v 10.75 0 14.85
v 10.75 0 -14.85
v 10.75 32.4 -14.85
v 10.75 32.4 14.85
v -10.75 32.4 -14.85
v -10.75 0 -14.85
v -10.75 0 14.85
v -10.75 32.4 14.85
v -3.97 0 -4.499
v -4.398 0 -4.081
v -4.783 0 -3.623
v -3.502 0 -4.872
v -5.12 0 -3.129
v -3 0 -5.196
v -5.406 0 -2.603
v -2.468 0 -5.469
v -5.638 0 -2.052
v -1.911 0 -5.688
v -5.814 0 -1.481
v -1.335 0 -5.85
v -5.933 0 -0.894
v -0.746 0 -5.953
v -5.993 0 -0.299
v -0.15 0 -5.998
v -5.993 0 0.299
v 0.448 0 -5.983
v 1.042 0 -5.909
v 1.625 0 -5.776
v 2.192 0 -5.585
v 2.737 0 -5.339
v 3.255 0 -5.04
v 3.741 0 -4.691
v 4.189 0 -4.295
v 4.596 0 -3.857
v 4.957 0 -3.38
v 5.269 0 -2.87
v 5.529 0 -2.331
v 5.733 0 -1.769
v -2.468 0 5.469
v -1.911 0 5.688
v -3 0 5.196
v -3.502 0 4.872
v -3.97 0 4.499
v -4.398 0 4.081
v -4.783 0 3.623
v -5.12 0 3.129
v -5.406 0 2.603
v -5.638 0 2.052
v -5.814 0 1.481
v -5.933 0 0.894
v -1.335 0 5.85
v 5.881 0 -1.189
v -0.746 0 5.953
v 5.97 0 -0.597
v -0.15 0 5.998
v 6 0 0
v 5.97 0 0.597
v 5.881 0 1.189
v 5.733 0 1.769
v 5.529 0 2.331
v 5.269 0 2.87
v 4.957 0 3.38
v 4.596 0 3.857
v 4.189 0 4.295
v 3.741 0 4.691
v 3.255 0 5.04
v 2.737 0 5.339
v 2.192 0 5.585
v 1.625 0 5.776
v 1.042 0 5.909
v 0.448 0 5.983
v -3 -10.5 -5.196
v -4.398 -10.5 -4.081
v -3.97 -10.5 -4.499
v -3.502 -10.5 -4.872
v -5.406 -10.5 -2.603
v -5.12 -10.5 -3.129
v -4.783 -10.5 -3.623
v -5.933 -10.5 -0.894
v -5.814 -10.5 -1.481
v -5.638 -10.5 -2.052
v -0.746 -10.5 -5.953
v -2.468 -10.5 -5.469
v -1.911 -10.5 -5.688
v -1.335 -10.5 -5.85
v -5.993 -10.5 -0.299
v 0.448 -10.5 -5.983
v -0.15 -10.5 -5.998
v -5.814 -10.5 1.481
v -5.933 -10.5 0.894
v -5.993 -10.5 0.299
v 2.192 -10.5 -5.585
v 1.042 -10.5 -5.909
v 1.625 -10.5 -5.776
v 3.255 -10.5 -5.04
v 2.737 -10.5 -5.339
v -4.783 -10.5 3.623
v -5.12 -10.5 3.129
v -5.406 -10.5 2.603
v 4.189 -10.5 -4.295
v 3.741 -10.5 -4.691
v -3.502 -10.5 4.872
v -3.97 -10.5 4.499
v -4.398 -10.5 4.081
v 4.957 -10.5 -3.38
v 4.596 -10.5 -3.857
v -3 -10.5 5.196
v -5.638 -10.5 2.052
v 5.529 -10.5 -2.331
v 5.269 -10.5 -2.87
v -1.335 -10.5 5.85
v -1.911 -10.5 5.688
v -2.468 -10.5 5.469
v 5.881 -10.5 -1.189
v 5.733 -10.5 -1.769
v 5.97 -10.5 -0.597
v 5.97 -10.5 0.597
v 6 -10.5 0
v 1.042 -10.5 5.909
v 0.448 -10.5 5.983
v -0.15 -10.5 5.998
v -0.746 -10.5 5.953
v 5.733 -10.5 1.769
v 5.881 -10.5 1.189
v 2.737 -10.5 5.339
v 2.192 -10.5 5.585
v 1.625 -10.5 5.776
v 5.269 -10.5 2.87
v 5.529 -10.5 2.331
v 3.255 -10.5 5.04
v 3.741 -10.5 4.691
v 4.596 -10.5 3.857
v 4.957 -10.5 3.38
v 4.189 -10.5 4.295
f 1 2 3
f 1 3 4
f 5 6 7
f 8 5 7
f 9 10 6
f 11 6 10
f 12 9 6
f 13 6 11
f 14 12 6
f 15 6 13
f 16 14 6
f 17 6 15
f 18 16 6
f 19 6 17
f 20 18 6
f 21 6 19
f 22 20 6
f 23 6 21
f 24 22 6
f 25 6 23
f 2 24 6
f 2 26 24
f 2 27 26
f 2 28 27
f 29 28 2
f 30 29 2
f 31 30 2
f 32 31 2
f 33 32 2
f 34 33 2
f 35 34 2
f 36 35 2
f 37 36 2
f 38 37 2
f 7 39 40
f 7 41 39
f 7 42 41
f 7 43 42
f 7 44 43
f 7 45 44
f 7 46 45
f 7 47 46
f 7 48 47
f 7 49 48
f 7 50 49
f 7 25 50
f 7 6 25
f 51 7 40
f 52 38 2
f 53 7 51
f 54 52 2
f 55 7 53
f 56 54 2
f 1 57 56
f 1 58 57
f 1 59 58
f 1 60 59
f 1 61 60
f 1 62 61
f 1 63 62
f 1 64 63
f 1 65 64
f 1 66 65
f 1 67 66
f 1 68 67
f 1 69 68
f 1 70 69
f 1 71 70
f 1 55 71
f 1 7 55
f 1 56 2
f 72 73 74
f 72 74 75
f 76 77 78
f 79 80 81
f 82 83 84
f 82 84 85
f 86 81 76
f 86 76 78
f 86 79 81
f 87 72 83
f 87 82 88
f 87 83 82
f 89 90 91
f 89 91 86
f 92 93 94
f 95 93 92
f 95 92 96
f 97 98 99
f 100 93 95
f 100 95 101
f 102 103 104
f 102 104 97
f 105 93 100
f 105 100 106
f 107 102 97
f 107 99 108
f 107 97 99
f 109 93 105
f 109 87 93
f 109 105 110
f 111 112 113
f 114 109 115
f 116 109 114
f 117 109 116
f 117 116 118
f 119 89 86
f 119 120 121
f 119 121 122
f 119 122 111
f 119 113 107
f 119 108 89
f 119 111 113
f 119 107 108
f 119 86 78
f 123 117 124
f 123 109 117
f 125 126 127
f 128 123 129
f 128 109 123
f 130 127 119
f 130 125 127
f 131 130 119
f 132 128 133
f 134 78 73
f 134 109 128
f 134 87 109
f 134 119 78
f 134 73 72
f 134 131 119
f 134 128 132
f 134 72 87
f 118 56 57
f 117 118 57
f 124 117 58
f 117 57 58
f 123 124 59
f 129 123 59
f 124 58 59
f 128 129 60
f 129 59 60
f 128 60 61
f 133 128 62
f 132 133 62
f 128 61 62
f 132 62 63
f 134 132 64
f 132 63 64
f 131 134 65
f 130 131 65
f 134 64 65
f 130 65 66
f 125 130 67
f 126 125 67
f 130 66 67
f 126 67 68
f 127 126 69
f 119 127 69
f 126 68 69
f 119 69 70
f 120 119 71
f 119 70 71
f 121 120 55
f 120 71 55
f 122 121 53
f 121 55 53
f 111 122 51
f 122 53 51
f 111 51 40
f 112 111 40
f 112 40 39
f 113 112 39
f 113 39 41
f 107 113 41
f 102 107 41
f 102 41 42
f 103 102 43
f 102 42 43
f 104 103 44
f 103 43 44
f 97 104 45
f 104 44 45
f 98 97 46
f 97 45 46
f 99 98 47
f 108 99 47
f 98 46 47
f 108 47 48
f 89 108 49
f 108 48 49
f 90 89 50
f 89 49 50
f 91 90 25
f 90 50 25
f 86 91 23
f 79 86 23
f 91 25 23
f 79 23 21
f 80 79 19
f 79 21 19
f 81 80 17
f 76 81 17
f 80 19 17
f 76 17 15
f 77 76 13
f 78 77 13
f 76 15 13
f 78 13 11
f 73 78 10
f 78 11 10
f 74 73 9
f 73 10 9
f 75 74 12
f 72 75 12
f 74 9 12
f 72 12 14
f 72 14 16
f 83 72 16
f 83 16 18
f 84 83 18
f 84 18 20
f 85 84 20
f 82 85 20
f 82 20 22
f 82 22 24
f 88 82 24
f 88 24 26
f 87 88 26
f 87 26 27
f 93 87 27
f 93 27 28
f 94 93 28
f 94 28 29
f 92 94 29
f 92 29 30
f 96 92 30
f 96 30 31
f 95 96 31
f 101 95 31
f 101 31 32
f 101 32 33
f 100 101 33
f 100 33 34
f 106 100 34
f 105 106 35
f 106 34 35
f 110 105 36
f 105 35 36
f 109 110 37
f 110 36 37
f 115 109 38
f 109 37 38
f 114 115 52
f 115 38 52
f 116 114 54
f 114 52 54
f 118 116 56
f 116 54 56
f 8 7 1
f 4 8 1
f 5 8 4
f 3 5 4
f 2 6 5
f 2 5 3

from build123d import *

# Parameters (mm, degrees)
F0_W     = 21.5
F0_H     = 29.7
F1_DEPTH = 32.4
F2_R     = 6
F3_DEPTH = 10.5


with BuildPart() as f1:
    # F0 (on Front) → F1 (new body)
    with BuildSketch(Plane.XZ):
        Rectangle(F0_W, F0_H)
    extrude(amount=-F1_DEPTH)

    # F2 (on face) → F3 (join)
    with BuildSketch(Plane.XZ):
        Circle(F2_R)
    extrude(amount=F3_DEPTH)


solid = f1.part
